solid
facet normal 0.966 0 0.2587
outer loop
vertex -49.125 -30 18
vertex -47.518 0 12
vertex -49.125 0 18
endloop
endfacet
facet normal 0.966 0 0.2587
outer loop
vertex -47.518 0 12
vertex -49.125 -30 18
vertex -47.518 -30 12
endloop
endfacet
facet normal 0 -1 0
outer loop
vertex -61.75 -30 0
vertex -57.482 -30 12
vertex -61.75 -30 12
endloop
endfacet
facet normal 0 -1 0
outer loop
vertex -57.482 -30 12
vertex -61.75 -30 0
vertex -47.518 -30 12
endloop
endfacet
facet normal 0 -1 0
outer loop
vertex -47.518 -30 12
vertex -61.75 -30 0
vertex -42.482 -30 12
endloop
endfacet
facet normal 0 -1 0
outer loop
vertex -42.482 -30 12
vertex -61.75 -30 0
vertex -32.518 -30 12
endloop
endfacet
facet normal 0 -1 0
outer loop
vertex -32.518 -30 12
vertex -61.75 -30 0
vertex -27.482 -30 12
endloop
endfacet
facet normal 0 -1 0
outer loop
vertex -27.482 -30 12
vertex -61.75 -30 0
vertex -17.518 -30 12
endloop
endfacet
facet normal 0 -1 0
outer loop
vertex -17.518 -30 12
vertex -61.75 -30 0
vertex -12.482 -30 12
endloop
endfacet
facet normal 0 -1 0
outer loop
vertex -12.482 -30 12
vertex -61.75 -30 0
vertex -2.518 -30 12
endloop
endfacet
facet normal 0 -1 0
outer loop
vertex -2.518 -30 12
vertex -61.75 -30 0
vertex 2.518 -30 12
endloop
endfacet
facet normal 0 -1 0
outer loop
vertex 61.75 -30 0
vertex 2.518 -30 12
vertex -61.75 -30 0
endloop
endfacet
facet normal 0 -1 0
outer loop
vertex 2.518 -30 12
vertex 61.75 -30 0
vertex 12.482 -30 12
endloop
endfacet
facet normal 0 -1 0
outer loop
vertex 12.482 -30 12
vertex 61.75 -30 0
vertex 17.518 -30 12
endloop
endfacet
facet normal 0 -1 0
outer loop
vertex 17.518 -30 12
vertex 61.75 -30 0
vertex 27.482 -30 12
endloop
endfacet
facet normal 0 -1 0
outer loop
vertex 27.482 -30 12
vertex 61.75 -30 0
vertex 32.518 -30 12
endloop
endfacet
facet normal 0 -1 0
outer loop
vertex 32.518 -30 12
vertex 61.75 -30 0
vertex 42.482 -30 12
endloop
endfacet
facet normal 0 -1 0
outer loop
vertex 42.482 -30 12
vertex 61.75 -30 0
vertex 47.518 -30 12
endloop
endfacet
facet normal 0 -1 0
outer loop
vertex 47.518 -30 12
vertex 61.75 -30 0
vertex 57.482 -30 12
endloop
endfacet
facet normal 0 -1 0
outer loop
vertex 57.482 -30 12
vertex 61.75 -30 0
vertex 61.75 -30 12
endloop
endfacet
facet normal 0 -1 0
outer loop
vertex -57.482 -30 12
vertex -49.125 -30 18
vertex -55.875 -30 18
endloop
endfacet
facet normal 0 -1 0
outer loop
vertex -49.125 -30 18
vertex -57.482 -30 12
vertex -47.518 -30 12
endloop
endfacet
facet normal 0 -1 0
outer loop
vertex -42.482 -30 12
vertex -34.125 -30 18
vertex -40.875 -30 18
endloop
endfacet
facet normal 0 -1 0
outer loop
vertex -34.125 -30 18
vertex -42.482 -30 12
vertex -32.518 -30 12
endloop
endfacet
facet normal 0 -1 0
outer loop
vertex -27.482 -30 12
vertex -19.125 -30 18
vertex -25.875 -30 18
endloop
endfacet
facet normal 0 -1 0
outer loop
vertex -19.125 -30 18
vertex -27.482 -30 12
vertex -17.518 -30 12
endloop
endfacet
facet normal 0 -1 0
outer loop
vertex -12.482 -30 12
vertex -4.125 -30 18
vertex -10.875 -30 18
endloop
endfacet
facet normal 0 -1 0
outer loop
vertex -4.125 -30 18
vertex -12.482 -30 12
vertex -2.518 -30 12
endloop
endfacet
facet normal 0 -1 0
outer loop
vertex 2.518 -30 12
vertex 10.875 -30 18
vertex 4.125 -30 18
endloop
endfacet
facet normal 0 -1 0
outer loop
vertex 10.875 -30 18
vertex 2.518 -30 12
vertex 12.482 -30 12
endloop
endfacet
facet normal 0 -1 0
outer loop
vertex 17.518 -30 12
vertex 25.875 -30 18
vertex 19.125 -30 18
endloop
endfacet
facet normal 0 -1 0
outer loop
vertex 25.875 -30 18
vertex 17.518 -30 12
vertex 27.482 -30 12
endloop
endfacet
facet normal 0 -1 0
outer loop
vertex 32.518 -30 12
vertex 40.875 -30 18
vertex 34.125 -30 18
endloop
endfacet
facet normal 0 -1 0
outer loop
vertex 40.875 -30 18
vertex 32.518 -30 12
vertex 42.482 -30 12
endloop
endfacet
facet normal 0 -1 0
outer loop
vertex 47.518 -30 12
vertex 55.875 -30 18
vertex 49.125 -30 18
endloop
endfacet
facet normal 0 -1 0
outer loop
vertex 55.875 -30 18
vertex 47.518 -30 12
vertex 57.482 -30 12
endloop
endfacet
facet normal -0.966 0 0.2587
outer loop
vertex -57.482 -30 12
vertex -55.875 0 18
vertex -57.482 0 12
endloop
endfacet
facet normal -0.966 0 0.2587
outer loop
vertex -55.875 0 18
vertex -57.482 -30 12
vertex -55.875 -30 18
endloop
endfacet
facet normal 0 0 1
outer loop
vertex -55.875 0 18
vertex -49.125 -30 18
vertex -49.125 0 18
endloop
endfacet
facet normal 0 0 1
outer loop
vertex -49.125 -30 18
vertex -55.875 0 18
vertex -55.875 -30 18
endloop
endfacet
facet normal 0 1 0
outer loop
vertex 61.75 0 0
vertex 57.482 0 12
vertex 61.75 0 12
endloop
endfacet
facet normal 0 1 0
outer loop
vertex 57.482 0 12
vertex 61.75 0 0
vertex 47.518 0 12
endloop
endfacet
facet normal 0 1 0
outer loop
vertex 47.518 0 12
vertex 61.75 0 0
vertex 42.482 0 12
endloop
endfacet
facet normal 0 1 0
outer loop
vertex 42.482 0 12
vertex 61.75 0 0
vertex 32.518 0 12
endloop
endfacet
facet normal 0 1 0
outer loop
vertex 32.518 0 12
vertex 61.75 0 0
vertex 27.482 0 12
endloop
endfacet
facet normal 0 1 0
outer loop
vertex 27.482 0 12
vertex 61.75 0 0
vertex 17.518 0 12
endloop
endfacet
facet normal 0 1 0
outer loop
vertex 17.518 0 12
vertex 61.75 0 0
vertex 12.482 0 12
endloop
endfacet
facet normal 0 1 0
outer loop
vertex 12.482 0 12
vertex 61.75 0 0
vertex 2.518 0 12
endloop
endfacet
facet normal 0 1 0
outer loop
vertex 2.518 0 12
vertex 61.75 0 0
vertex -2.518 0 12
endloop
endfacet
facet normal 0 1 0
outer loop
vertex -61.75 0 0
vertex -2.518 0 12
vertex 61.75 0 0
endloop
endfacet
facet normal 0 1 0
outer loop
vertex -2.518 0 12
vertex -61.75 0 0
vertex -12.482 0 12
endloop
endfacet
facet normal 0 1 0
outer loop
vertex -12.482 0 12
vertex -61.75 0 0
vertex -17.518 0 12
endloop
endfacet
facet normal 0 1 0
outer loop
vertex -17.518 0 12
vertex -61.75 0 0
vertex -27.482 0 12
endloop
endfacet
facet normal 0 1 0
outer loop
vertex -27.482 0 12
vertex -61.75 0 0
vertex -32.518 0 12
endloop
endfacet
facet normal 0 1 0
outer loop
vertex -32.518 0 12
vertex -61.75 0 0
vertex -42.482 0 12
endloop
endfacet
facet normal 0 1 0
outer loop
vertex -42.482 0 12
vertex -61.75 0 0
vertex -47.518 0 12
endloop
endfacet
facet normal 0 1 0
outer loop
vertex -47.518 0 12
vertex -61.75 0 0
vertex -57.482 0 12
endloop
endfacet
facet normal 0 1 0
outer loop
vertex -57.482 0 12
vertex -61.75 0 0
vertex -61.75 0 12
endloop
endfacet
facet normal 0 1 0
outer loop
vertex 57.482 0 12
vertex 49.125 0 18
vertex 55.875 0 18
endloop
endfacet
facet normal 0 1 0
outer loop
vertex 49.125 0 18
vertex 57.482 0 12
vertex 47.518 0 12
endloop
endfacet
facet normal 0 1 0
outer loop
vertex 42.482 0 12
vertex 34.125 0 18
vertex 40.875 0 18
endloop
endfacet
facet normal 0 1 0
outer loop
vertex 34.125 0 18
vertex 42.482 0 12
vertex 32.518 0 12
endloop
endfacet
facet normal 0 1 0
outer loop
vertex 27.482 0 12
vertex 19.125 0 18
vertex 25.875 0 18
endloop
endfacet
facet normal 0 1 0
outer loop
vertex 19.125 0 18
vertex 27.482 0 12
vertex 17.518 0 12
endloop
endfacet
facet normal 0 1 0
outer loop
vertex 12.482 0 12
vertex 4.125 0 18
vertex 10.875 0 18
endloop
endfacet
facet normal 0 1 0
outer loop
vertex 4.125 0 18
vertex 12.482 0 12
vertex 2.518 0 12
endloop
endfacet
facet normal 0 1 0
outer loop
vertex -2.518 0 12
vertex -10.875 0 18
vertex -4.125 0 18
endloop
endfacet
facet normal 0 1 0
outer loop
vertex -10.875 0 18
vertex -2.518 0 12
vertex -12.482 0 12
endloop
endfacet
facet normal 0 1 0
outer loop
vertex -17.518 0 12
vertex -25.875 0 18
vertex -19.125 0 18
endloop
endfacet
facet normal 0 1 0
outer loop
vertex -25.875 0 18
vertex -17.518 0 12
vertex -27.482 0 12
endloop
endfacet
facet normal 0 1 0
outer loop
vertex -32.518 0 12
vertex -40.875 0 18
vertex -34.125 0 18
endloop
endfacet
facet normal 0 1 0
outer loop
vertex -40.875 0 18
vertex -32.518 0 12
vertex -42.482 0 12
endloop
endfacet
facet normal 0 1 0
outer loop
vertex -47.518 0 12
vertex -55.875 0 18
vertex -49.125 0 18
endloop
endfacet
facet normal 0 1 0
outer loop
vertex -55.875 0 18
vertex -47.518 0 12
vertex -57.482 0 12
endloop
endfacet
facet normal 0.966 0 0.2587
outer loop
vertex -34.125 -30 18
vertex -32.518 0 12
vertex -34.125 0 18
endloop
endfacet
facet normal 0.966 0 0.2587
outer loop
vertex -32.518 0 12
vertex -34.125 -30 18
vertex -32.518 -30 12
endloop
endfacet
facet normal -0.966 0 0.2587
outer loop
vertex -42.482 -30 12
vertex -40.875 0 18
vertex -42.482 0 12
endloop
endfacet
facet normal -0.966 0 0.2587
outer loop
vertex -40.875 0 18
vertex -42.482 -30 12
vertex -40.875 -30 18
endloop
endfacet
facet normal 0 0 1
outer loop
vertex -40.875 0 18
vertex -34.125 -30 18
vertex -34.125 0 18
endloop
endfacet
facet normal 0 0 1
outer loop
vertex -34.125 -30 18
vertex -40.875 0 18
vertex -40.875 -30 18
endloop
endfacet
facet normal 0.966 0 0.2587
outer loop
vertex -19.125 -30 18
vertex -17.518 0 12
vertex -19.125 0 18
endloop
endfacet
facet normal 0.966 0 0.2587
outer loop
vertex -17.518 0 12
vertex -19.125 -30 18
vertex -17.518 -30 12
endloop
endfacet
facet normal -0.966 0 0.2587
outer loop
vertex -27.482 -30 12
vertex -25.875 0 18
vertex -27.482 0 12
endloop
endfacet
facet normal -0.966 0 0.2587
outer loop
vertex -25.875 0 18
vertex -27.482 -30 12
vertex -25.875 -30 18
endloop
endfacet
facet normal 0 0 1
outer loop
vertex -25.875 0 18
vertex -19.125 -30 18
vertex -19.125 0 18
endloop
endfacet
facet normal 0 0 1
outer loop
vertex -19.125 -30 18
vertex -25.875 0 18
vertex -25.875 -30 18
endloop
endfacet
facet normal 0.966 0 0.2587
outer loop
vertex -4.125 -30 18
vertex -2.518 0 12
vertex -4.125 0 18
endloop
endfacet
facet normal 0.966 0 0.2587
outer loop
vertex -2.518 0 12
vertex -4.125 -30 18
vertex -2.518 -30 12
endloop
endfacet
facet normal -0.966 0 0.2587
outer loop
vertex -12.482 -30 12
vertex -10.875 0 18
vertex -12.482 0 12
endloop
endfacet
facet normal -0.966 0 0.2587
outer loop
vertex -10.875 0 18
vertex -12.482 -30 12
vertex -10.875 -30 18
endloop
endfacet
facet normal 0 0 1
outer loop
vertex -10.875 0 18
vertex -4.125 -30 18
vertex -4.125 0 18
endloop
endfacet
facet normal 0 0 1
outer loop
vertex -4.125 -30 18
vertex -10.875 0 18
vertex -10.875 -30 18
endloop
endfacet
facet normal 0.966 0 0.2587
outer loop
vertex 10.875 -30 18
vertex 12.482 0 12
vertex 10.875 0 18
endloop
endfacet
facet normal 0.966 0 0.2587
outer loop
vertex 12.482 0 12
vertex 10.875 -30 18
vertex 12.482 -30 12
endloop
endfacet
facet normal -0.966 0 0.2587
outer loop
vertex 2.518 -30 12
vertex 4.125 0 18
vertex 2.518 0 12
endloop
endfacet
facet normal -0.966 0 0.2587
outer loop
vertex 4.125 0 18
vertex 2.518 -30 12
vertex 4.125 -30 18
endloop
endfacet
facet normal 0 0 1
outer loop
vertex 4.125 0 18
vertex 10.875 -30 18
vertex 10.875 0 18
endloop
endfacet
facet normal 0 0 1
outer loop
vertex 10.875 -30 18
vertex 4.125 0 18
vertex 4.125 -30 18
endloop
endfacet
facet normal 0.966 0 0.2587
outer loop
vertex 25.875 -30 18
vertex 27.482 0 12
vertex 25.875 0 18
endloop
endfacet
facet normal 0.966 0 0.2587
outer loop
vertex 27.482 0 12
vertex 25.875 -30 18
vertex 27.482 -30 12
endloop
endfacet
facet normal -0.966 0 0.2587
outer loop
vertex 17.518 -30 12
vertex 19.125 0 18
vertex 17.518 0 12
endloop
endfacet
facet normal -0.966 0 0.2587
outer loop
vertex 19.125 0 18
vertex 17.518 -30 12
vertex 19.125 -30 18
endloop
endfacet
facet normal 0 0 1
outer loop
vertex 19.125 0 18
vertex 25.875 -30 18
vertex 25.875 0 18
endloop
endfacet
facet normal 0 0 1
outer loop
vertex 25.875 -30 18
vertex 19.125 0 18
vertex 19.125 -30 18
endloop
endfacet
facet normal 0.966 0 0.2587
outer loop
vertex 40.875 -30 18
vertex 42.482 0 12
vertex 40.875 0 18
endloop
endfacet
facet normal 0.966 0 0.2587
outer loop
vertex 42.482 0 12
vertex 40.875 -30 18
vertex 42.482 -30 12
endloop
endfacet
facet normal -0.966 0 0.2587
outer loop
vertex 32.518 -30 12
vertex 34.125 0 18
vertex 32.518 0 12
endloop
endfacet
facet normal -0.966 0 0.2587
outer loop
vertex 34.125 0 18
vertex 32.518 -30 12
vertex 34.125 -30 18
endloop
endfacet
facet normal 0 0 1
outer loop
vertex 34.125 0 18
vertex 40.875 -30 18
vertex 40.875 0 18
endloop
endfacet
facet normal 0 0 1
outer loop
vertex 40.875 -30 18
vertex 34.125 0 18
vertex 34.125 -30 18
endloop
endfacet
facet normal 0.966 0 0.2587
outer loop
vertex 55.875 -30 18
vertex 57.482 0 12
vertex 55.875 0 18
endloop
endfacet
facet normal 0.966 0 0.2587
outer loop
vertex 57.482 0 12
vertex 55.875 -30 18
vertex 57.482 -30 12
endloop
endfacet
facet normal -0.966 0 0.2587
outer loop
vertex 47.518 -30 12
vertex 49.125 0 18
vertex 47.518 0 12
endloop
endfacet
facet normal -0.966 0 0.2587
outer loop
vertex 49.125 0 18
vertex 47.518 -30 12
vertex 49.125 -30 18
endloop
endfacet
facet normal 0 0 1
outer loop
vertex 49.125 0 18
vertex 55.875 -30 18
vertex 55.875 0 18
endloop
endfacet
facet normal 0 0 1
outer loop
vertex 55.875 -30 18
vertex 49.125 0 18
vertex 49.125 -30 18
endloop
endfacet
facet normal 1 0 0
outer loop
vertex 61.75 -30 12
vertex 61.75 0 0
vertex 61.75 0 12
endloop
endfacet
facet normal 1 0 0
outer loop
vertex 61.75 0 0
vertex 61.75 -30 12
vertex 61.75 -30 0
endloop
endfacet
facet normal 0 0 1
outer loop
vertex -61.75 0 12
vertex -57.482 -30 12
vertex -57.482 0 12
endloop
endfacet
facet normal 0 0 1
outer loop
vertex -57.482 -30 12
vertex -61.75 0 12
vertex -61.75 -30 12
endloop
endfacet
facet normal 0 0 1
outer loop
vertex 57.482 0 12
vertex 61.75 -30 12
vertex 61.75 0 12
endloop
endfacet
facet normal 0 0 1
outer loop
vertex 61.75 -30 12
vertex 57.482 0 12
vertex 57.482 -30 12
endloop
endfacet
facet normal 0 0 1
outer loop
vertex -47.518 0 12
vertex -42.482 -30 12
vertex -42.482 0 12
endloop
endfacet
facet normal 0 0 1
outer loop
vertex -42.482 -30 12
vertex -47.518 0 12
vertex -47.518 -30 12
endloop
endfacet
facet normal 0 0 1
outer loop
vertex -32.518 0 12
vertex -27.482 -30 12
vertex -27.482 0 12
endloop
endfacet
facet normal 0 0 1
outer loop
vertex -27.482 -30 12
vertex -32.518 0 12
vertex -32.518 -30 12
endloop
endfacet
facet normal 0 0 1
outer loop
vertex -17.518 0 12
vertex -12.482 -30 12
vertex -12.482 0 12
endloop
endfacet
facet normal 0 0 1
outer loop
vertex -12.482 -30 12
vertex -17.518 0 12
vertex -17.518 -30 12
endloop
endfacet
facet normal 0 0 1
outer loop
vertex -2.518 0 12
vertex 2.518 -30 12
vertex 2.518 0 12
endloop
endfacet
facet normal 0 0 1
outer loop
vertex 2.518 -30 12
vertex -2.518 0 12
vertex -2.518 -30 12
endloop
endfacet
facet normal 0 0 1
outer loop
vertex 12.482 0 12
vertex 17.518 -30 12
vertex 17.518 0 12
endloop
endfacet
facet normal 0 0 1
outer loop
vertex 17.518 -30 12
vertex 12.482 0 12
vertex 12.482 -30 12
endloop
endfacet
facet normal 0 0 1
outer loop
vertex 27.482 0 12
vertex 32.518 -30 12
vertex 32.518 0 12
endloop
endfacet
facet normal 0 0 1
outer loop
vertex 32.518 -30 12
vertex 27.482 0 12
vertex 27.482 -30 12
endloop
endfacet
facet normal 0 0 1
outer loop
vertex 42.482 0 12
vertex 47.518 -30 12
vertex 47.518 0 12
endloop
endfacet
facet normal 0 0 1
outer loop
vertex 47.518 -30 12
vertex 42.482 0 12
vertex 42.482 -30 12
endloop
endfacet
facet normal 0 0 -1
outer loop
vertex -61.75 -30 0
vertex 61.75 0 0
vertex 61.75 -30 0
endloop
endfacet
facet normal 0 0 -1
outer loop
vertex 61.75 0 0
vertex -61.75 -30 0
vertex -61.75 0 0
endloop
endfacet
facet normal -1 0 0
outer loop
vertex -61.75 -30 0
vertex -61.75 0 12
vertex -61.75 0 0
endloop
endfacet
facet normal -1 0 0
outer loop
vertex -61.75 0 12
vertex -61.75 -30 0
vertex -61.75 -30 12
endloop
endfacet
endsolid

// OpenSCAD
$fn = 32;

// ----------------------------------------------------------------------
// Toothed rack, 8 teeth
// 15 mm pitch, 6 mm teeth
// ----------------------------------------------------------------------

// --- parameters (mm) ---
bar_w = 30;      // bar width (Y)
bar_h = 12;      // bar height (Z)
teeth = 8;       // number of teeth
pitch = 15;      // tooth pitch
tooth_h = 6;     // tooth height above the bar
root_w = 10.5;   // tooth width at the root
crest_w = 6.75;  // tooth width at the crest

// --- derived feature positions (mm) ---
span = (teeth - 1) * pitch;  // = 105   distance between the outer teeth
bar_l = span + root_w + 8;   // = 123.5   bar length: teeth plus 4 mm at each end
tooth_x = -span / 2;         // = -52.5   X of the first tooth
height = bar_h + tooth_h;    // = 18   overall height
feature_centers = [
  [tooth_x + 0 * pitch, -bar_w / 2],
  [tooth_x + 1 * pitch, -bar_w / 2],
  [tooth_x + 2 * pitch, -bar_w / 2],
  [tooth_x + 3 * pitch, -bar_w / 2],
  [tooth_x + 4 * pitch, -bar_w / 2],
  [tooth_x + 5 * pitch, -bar_w / 2],
  [tooth_x + 6 * pitch, -bar_w / 2],
  [tooth_x + 7 * pitch, -bar_w / 2]
];   // tooth centre line, drives the tooth loop

// bar with a rack of teeth, one extruded trapezoium per centre
module rack_tooth() {
  linear_extrude(height = bar_w)
    polygon(points = [
      [0, 0],
      [root_w, 0],
      [root_w / 2 + crest_w / 2, tooth_h + 1],
      [root_w / 2 - crest_w / 2, tooth_h + 1]
    ]);
}

union() {
  translate([-bar_l / 2, -bar_w, 0]) cube([bar_l, bar_w, bar_h]);
  for (centre = feature_centers)
    translate([centre[0] - root_w / 2, 0, bar_h - 1]) rotate([90, 0, 0]) rack_tooth();
}
